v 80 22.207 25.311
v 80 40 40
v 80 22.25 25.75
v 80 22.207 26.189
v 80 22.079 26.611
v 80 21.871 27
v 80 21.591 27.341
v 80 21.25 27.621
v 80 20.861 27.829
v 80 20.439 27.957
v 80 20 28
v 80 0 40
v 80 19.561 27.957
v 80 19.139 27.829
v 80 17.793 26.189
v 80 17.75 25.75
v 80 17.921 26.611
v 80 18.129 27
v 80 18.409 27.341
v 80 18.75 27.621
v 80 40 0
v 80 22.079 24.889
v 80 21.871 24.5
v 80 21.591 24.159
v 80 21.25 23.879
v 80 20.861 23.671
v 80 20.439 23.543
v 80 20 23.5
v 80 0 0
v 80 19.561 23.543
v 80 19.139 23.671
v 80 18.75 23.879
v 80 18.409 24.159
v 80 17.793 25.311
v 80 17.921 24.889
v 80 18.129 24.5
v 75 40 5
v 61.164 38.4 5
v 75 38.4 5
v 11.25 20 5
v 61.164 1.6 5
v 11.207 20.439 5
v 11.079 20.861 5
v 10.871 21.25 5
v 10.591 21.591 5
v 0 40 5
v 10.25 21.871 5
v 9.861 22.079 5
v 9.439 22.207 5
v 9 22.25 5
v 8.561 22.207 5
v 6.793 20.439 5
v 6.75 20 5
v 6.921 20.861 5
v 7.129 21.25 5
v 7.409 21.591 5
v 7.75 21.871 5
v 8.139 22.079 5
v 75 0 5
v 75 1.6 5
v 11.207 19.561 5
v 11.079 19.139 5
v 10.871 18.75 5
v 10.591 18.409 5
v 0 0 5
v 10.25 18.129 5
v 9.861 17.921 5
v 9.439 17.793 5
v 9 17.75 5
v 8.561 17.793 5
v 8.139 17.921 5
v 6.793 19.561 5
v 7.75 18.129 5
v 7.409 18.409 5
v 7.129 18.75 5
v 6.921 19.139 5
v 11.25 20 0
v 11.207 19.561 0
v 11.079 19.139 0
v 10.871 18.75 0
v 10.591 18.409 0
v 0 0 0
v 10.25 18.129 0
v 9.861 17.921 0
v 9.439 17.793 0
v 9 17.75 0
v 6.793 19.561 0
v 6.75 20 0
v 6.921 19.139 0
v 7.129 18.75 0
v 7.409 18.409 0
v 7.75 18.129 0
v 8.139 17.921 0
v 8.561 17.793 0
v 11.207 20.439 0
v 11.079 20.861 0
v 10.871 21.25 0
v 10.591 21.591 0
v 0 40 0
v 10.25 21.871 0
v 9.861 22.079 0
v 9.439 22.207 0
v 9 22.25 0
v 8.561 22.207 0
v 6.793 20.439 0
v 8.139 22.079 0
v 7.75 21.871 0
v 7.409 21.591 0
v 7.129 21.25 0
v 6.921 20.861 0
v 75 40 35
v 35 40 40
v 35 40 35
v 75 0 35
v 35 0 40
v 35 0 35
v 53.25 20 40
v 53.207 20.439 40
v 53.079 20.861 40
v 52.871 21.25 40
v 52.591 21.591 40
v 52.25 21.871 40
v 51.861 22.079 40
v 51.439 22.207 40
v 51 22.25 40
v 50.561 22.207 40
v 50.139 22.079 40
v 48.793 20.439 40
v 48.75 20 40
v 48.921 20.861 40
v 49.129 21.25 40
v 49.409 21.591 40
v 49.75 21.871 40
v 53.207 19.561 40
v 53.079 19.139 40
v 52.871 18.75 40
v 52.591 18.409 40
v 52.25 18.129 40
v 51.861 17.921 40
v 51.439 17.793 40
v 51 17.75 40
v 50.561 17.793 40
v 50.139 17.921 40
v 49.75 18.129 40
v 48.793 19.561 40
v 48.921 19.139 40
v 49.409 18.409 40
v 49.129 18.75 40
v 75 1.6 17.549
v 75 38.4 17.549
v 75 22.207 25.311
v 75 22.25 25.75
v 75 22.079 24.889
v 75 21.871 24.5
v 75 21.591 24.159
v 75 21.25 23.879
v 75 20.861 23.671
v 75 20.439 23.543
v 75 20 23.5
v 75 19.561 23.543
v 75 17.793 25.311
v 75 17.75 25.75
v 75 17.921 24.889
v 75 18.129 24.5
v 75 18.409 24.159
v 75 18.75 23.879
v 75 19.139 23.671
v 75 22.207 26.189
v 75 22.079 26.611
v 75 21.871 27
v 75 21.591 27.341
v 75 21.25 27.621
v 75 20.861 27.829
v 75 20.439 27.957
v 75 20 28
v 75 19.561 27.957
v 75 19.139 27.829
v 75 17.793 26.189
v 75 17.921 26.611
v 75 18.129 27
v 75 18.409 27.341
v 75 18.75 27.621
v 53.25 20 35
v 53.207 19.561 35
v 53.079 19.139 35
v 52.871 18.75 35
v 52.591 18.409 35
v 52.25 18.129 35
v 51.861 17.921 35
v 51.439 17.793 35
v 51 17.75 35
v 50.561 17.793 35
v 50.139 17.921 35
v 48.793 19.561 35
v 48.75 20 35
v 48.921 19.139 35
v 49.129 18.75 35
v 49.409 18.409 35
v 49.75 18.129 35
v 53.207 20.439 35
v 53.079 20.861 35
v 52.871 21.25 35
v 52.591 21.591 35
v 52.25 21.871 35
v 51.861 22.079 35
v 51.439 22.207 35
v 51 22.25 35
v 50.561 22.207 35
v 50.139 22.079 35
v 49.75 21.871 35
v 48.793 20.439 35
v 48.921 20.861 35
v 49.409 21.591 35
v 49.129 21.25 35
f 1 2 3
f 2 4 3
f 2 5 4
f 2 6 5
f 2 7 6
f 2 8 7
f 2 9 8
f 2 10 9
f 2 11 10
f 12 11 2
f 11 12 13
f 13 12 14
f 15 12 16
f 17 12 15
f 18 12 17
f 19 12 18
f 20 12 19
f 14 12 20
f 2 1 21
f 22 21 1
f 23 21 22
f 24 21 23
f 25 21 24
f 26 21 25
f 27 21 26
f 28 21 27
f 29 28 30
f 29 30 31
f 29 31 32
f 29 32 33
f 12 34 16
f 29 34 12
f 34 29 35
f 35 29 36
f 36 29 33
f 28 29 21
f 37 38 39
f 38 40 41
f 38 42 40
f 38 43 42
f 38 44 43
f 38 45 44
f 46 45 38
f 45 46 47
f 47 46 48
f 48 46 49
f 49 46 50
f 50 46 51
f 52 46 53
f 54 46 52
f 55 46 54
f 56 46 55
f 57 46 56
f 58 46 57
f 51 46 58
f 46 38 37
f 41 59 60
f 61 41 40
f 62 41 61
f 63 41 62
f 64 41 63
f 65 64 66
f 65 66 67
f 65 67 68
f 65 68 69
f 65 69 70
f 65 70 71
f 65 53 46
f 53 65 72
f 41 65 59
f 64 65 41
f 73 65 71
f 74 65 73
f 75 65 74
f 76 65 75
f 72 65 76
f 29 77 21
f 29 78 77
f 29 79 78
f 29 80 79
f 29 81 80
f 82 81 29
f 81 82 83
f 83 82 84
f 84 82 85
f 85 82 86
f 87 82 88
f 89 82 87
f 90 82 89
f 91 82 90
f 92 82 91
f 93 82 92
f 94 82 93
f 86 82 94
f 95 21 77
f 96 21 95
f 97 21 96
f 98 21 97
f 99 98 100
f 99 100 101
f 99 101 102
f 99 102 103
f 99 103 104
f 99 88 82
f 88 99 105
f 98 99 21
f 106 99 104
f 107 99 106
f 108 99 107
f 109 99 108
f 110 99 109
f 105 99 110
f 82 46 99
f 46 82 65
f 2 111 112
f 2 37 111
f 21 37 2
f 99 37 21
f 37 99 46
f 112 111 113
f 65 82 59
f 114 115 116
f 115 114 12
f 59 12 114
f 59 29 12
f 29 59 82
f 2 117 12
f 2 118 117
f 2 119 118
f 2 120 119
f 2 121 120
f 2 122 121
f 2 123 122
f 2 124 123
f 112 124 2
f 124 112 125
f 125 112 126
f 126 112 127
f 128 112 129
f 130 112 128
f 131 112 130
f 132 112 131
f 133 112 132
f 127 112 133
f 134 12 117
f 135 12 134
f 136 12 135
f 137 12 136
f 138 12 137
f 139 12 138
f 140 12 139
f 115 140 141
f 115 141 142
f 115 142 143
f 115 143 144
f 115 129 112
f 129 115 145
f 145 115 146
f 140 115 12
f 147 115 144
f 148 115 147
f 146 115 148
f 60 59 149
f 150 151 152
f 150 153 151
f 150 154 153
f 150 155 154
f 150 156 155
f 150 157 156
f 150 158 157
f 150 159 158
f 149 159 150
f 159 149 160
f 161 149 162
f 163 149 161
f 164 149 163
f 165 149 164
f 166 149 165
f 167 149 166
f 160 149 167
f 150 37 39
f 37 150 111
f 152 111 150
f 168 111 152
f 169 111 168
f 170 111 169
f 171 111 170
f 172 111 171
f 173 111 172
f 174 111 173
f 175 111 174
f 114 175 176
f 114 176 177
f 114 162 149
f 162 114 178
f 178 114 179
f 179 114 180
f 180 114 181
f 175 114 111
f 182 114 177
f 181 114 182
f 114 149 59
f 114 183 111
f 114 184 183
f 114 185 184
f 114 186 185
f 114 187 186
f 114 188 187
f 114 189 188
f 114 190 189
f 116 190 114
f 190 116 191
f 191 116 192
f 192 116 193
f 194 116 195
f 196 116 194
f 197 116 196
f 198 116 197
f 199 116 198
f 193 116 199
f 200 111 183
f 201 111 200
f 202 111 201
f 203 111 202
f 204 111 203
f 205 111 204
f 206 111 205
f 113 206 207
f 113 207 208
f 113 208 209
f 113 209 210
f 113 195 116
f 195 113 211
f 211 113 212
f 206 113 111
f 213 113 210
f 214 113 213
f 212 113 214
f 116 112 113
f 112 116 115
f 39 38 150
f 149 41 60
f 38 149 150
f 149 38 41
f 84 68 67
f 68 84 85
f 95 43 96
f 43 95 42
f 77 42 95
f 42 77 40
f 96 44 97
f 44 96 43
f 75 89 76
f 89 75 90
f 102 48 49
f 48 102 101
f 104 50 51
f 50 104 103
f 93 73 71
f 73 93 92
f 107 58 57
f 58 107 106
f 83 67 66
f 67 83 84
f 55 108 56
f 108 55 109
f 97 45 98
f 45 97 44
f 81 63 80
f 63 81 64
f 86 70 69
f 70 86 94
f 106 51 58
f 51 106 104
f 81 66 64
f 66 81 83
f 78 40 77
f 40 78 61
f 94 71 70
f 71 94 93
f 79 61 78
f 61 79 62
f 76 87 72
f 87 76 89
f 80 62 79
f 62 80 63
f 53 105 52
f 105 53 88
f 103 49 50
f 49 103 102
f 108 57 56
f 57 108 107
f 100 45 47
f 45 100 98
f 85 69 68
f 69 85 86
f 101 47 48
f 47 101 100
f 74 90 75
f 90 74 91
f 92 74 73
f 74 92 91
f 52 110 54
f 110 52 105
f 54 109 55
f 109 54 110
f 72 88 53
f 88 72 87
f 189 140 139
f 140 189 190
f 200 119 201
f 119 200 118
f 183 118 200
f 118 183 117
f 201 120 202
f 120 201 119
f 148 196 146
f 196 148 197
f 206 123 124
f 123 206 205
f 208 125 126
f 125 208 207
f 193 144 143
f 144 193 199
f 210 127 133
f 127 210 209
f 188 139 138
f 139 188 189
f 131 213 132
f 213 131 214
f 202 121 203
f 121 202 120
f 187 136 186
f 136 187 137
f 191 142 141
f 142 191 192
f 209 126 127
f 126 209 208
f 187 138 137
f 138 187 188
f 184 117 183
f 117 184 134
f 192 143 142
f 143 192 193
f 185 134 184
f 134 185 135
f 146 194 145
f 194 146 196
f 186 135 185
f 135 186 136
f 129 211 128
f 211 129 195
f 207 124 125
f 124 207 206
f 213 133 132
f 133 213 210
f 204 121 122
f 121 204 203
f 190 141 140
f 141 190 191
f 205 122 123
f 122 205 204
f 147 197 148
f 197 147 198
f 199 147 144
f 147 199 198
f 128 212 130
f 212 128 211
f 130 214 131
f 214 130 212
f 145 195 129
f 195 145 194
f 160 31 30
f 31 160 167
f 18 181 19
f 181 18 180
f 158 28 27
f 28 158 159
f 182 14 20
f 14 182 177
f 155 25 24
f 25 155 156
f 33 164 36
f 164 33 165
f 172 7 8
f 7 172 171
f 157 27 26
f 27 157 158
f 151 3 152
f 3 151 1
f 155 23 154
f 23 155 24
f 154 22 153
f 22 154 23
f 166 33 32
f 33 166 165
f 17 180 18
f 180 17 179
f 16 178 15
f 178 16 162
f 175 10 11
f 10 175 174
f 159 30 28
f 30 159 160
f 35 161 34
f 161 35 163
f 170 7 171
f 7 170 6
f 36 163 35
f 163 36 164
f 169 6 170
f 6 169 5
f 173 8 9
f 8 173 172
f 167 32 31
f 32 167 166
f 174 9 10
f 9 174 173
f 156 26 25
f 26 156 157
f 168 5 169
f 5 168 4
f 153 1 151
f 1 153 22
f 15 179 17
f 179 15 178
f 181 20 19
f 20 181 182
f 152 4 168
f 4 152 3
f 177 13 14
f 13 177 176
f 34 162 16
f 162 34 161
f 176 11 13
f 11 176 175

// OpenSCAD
$fn = 32;

// ----------------------------------------------------------------------
// Z-bracket: 80 x 40 x 40 mm
// ----------------------------------------------------------------------

// --- parameters (mm) ---
lower_len = 80;           // lower foot length, X
upper_len = 40;           // upper foot length, X
width = 40;               // bracket width, Y
rise = 40;                // overall rise, Z
thick = 5;                // plate thickness
hole_d = 4.5;             // clearance for M4
rib_len = 15.6;           // gusset leg
rib_sink = 1.6;           // gusset overlap into the plates

module hole_z(px, py, z0) {
  translate([px, py, z0 - 2.5]) cylinder(h = thick + 5, d = hole_d);
}
module hole_x(py, pz) {
  translate([-2.5, py, pz]) rotate([0, 90, 0]) cylinder(h = thick + 5, d = hole_d);
}
module gusset(x0) {
  translate([x0, width - rib_sink, 0])
    rotate([90, 0, 0])
      linear_extrude(height = width - 2 * rib_sink)
        polygon(points = [[rib_sink, thick - rib_sink],
                          [rib_sink, thick - rib_sink + rib_len],
                          [-rib_len, thick - rib_sink]]);
}

difference() {
  union() {
    cube([lower_len, width, thick]);
    /* web, overlapping the lower foot */
    translate([lower_len - thick, 0, 0]) cube([thick, width, rise]);
    /* upper foot, sunk into the web */
    translate([lower_len - thick - upper_len, 0, rise - thick]) cube([upper_len + thick, width, thick]);
    gusset(lower_len - thick);
  }
  hole_z(9, 20, 0);
  translate([lower_len - thick - 24, 0, 0]) hole_z(0, 20, rise - thick);
  translate([lower_len - thick, 0, 0]) hole_x(20, 25.75);
}
